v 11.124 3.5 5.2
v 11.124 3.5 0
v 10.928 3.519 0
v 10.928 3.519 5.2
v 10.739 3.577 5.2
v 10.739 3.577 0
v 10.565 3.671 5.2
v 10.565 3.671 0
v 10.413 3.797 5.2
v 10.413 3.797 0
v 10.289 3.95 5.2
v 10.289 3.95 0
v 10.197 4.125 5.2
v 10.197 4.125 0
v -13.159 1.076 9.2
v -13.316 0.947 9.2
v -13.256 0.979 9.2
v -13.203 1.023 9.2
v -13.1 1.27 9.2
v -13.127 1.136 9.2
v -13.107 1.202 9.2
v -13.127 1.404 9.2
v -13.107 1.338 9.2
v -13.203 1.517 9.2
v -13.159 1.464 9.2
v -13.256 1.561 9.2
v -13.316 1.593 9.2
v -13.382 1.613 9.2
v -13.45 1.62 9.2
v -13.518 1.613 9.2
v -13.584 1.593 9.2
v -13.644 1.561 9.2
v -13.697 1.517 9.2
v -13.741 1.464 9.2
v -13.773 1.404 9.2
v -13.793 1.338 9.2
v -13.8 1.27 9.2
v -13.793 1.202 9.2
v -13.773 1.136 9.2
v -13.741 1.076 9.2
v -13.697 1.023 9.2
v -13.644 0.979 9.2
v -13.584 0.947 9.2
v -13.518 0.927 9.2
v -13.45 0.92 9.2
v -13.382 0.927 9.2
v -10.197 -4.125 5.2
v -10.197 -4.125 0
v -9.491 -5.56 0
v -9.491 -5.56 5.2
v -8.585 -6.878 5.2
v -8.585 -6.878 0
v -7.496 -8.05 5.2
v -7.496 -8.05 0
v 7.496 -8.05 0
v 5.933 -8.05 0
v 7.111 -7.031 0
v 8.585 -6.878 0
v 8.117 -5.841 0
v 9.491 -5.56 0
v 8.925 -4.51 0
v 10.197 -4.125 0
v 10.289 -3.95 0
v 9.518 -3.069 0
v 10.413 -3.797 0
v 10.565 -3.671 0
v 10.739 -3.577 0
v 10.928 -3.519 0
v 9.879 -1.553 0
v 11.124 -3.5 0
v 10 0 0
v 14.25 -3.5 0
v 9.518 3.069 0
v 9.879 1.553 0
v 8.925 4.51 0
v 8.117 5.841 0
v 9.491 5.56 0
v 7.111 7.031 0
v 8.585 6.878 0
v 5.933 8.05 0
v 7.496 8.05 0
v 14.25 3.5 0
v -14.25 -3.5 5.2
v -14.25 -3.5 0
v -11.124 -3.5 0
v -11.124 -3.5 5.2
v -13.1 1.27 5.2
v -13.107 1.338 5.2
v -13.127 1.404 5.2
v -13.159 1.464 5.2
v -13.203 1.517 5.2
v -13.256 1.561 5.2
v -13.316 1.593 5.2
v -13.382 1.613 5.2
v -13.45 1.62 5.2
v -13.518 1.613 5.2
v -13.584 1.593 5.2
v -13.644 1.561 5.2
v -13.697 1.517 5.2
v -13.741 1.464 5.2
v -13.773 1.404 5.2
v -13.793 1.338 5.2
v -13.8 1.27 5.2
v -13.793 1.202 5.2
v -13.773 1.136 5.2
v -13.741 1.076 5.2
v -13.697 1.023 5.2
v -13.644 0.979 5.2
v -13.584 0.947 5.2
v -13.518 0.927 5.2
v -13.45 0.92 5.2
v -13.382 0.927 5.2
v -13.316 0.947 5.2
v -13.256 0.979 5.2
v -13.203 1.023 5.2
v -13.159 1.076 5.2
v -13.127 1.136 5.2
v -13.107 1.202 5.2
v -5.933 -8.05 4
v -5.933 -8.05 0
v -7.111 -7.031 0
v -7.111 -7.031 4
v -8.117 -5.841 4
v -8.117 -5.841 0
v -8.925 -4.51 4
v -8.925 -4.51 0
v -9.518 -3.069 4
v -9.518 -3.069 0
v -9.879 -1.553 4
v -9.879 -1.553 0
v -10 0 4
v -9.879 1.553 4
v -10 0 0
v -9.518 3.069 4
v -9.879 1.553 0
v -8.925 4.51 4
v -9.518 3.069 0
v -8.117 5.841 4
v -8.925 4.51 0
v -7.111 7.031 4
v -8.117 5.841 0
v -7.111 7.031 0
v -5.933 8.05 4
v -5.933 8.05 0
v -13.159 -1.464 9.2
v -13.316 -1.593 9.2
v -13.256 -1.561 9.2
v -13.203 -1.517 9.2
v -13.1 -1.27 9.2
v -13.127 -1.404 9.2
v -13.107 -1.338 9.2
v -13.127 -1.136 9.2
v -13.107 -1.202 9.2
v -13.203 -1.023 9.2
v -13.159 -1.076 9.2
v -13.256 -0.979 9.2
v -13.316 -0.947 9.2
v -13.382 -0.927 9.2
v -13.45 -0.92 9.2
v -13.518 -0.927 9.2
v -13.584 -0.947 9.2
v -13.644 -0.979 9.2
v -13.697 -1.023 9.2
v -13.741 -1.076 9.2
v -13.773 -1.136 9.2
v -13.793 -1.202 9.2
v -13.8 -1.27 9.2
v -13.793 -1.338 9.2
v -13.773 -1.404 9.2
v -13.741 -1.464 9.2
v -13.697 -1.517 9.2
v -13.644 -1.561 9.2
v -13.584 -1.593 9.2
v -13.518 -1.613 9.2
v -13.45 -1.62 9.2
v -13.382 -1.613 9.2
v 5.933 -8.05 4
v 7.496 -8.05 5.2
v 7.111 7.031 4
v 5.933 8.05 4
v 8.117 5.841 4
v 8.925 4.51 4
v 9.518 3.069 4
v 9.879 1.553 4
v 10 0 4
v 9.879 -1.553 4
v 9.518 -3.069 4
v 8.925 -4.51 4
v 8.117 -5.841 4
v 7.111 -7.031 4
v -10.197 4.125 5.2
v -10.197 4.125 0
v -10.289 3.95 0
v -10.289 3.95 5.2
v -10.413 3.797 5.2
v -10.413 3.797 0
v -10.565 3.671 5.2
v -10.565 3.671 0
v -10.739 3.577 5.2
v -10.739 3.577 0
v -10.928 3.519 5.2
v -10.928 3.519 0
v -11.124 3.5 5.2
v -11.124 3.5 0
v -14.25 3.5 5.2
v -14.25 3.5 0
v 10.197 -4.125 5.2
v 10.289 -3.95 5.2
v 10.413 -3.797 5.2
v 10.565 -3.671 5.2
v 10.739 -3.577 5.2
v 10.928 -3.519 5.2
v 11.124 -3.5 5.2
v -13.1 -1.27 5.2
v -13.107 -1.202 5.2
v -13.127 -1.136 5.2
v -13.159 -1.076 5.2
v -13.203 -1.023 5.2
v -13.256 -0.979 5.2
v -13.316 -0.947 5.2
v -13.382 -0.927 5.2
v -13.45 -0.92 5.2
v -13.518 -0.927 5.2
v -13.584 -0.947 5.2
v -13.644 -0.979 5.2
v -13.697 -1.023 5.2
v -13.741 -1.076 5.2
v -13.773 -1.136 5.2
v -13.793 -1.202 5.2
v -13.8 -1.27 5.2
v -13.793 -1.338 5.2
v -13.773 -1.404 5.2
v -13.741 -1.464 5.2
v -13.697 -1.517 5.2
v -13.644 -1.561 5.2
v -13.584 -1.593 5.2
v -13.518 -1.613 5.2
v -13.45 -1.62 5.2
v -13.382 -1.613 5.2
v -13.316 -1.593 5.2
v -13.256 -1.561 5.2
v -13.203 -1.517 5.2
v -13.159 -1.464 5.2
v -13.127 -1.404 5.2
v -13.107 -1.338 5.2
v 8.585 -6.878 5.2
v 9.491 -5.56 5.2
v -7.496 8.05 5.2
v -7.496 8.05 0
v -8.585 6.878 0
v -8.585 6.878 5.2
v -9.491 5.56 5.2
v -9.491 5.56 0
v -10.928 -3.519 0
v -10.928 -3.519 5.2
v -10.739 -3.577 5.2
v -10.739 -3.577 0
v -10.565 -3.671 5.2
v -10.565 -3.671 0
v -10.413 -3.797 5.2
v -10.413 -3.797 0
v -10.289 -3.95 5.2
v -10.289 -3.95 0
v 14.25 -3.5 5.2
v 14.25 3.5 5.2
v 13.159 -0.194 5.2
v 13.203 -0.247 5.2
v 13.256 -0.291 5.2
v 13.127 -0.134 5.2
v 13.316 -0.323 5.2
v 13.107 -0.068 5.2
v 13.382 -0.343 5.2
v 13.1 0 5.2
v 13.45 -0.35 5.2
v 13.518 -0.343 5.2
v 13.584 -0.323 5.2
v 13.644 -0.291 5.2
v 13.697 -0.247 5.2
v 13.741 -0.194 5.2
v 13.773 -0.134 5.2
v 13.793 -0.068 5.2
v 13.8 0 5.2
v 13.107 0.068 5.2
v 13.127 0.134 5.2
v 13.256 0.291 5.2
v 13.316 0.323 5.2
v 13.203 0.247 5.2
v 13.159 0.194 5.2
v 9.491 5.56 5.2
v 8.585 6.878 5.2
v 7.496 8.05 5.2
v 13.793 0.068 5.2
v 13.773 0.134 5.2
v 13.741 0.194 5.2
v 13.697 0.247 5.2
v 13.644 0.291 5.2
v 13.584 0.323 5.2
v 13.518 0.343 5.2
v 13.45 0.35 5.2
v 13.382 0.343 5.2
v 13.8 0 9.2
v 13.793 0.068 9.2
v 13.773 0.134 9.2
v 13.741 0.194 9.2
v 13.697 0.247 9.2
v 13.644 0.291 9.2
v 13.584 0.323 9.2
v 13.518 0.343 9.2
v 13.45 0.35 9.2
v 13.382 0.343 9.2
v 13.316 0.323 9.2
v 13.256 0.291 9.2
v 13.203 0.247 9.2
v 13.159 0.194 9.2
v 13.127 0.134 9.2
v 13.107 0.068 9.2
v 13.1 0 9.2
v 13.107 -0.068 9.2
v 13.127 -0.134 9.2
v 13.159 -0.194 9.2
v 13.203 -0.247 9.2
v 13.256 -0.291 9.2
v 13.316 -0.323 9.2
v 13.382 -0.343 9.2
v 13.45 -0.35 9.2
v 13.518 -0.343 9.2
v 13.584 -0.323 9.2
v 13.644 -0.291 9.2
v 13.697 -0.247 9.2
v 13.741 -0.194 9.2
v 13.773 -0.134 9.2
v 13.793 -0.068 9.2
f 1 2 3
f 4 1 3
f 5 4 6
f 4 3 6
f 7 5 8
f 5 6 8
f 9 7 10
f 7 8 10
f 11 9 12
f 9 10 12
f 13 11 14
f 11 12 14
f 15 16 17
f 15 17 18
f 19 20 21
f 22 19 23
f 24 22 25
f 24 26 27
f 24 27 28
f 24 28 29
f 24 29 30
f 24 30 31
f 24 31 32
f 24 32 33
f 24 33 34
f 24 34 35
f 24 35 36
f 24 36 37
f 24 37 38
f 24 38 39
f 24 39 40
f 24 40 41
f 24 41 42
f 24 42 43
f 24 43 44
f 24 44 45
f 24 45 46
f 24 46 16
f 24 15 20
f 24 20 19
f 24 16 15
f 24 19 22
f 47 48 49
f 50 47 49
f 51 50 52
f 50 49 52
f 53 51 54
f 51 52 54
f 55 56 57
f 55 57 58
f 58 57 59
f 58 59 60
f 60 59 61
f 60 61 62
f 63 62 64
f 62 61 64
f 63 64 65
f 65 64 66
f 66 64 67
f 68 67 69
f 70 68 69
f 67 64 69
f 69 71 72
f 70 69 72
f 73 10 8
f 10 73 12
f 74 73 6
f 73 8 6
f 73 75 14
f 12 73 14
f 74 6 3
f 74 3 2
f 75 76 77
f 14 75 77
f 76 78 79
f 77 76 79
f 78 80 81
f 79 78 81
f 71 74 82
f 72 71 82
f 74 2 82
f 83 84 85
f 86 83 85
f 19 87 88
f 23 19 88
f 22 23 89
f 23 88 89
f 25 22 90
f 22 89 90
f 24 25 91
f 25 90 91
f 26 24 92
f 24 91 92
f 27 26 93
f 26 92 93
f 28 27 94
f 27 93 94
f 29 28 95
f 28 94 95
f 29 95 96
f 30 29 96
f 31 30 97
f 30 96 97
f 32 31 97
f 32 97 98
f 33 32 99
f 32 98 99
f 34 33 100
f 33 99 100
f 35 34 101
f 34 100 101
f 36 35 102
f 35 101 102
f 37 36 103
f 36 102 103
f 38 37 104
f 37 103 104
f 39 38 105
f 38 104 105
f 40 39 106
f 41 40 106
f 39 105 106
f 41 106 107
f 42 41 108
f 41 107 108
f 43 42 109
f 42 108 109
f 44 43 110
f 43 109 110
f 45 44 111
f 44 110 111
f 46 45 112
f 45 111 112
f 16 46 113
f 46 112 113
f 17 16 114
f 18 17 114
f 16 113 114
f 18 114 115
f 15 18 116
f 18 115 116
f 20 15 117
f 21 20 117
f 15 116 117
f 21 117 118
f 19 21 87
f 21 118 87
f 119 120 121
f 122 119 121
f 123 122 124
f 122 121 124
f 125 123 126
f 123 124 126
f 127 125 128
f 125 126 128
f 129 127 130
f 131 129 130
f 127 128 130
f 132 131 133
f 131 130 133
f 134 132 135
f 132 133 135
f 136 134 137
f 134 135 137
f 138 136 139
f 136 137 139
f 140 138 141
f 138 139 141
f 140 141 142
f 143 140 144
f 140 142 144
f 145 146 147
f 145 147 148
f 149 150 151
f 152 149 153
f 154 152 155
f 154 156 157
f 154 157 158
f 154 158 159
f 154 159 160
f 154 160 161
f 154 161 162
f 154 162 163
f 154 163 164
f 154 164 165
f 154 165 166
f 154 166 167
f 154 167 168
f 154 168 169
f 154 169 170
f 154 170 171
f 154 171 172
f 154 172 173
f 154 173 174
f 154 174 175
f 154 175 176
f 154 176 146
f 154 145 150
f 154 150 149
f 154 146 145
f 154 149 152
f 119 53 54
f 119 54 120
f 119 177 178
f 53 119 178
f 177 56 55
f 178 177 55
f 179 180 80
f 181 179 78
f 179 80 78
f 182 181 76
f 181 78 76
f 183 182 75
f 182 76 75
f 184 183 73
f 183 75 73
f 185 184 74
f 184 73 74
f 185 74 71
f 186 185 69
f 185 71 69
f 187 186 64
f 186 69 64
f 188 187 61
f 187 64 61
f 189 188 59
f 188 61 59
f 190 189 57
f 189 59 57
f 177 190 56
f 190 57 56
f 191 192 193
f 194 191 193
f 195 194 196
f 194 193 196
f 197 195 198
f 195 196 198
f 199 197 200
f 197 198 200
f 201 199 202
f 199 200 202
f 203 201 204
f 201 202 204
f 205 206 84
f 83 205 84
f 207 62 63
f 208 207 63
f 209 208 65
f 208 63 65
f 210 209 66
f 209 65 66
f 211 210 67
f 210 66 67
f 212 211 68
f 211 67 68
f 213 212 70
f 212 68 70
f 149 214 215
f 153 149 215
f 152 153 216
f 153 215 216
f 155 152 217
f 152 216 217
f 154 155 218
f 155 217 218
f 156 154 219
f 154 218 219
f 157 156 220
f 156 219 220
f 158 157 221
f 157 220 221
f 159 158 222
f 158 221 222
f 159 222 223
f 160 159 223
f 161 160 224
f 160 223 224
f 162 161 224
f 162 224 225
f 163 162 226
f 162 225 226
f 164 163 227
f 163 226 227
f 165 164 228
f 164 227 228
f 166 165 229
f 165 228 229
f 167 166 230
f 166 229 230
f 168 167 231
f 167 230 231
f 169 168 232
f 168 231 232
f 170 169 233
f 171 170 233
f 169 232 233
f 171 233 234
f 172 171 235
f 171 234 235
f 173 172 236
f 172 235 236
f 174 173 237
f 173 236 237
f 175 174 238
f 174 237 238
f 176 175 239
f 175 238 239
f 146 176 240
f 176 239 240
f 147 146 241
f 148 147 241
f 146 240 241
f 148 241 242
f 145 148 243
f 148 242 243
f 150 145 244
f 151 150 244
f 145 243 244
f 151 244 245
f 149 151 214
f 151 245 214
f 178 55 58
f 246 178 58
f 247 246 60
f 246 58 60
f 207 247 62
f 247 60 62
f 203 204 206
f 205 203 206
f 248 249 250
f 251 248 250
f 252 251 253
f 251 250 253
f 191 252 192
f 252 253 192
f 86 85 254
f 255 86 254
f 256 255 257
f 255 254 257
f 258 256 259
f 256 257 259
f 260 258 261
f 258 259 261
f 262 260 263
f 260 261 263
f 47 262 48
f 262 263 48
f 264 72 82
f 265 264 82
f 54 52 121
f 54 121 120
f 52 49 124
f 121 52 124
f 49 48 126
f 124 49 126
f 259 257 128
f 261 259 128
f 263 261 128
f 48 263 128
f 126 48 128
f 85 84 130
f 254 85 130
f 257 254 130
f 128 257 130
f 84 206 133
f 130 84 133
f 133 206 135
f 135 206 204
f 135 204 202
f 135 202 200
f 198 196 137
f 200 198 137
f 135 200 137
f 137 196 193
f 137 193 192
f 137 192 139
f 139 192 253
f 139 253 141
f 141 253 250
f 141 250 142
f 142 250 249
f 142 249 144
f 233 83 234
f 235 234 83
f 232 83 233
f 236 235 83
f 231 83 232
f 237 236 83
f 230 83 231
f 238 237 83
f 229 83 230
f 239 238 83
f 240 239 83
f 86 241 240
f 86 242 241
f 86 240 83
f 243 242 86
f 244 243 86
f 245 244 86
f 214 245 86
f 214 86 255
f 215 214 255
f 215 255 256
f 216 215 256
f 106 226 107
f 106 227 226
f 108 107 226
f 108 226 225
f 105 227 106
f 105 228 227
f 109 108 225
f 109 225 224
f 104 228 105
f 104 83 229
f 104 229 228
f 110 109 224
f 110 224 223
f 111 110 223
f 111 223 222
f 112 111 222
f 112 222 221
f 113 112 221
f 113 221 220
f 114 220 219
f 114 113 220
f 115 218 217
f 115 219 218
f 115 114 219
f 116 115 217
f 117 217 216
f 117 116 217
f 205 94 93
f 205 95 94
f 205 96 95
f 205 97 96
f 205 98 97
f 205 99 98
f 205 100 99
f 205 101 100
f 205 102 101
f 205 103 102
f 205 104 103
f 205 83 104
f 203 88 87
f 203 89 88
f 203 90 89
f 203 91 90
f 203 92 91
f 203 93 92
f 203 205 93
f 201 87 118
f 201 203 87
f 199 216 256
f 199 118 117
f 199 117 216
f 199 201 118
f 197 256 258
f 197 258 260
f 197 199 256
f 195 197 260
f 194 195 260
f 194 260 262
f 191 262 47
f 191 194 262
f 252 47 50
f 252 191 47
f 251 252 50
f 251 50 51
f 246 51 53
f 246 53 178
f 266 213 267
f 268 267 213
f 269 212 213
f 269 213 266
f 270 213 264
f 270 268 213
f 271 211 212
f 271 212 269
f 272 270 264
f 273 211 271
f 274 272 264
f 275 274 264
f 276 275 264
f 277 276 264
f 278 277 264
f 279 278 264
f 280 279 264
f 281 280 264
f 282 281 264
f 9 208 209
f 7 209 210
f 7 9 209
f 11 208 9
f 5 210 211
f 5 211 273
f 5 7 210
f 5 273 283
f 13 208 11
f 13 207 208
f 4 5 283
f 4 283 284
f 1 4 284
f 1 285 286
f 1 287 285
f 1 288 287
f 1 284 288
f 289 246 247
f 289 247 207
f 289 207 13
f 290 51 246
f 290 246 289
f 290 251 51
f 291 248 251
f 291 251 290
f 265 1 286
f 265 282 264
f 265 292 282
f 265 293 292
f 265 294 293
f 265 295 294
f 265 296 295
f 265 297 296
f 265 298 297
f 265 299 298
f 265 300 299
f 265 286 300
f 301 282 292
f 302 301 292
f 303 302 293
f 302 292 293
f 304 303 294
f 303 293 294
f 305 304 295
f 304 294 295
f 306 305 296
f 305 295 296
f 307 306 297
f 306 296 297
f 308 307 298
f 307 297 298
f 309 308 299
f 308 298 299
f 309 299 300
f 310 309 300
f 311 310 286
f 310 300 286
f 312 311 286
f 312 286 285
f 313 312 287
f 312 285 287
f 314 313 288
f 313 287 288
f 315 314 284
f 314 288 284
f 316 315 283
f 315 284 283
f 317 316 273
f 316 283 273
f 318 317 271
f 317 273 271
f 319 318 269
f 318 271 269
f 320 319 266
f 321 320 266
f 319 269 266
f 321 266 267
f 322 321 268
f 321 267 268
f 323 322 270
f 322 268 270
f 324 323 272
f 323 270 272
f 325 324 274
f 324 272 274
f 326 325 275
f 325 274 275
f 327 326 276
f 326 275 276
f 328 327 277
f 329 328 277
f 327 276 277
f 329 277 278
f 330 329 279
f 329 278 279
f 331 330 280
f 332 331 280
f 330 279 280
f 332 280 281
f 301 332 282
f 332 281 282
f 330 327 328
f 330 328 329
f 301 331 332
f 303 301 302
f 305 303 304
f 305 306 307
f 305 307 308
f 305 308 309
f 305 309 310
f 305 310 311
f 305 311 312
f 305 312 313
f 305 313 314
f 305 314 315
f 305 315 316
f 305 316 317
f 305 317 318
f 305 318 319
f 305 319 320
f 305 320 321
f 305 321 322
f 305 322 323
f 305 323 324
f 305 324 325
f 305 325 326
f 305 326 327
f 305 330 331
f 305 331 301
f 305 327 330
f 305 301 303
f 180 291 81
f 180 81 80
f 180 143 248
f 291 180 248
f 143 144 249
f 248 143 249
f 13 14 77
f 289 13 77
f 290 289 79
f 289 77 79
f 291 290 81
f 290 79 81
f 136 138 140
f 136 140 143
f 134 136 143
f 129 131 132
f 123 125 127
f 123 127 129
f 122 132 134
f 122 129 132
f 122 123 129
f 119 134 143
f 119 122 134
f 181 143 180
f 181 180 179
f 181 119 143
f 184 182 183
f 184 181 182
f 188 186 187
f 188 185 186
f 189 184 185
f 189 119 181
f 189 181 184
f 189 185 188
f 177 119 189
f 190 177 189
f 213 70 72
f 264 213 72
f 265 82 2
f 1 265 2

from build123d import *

# Parameters (mm, degrees)
F1_DEPTH = 5.2
F2_R     = 10
F3_DEPTH = 4
F4_R     = 0.35
F5_DEPTH = 4


with BuildPart() as f1:
    # F0 (on Top) → F1 (new body)
    with BuildSketch(Plane.XY):
        with BuildLine():
            Line((7.496499, 8.05), (-7.496499, 8.05))
            ThreePointArc((-7.496499, 8.05), (-9.061942, 6.235479), (-10.197273, 4.125))
            ThreePointArc((-10.197273, 4.125), (-10.565281, 3.670844), (-11.124298, 3.5))
            Line((-11.124298, 3.5), (-14.25, 3.5))
            Line((-14.25, 3.5), (-14.25, -3.5))
            Line((-14.25, -3.5), (-11.124298, -3.5))
            ThreePointArc((-11.124298, -3.5), (-10.565281, -3.670844), (-10.197273, -4.125))
            ThreePointArc((-10.197273, -4.125), (-9.061942, -6.235479), (-7.496499, -8.05))
            Line((-7.496499, -8.05), (7.496499, -8.05))
            ThreePointArc((7.496499, -8.05), (9.061942, -6.235479), (10.197273, -4.125))
            ThreePointArc((10.197273, -4.125), (10.565281, -3.670844), (11.124298, -3.5))
            Line((11.124298, -3.5), (14.25, -3.5))
            Line((14.25, -3.5), (14.25, 3.5))
            Line((14.25, 3.5), (11.124298, 3.5))
            ThreePointArc((11.124298, 3.5), (10.565281, 3.670844), (10.197273, 4.125))
            ThreePointArc((10.197273, 4.125), (9.061942, 6.235479), (7.496499, 8.05))
        make_face()
    extrude(amount=F1_DEPTH)

    # F2 (on face) → F3 (cut)
    with BuildSketch(Plane(origin=(0, 0, 0), x_dir=(1, 0, 0), z_dir=(0, 0, -1))):
        Circle(F2_R)
    extrude(amount=-F3_DEPTH, mode=Mode.SUBTRACT)

    # F4 (on face) → F5 (join)
    with BuildSketch(Plane.XY.offset(5.2)):
        with Locations((13.45, 0)):
            Circle(F4_R)
        with Locations((-13.45, 1.27)):
            Circle(F4_R)
        with Locations((-13.45, -1.27)):
            Circle(F4_R)
    extrude(amount=F5_DEPTH)


solid = f1.part
